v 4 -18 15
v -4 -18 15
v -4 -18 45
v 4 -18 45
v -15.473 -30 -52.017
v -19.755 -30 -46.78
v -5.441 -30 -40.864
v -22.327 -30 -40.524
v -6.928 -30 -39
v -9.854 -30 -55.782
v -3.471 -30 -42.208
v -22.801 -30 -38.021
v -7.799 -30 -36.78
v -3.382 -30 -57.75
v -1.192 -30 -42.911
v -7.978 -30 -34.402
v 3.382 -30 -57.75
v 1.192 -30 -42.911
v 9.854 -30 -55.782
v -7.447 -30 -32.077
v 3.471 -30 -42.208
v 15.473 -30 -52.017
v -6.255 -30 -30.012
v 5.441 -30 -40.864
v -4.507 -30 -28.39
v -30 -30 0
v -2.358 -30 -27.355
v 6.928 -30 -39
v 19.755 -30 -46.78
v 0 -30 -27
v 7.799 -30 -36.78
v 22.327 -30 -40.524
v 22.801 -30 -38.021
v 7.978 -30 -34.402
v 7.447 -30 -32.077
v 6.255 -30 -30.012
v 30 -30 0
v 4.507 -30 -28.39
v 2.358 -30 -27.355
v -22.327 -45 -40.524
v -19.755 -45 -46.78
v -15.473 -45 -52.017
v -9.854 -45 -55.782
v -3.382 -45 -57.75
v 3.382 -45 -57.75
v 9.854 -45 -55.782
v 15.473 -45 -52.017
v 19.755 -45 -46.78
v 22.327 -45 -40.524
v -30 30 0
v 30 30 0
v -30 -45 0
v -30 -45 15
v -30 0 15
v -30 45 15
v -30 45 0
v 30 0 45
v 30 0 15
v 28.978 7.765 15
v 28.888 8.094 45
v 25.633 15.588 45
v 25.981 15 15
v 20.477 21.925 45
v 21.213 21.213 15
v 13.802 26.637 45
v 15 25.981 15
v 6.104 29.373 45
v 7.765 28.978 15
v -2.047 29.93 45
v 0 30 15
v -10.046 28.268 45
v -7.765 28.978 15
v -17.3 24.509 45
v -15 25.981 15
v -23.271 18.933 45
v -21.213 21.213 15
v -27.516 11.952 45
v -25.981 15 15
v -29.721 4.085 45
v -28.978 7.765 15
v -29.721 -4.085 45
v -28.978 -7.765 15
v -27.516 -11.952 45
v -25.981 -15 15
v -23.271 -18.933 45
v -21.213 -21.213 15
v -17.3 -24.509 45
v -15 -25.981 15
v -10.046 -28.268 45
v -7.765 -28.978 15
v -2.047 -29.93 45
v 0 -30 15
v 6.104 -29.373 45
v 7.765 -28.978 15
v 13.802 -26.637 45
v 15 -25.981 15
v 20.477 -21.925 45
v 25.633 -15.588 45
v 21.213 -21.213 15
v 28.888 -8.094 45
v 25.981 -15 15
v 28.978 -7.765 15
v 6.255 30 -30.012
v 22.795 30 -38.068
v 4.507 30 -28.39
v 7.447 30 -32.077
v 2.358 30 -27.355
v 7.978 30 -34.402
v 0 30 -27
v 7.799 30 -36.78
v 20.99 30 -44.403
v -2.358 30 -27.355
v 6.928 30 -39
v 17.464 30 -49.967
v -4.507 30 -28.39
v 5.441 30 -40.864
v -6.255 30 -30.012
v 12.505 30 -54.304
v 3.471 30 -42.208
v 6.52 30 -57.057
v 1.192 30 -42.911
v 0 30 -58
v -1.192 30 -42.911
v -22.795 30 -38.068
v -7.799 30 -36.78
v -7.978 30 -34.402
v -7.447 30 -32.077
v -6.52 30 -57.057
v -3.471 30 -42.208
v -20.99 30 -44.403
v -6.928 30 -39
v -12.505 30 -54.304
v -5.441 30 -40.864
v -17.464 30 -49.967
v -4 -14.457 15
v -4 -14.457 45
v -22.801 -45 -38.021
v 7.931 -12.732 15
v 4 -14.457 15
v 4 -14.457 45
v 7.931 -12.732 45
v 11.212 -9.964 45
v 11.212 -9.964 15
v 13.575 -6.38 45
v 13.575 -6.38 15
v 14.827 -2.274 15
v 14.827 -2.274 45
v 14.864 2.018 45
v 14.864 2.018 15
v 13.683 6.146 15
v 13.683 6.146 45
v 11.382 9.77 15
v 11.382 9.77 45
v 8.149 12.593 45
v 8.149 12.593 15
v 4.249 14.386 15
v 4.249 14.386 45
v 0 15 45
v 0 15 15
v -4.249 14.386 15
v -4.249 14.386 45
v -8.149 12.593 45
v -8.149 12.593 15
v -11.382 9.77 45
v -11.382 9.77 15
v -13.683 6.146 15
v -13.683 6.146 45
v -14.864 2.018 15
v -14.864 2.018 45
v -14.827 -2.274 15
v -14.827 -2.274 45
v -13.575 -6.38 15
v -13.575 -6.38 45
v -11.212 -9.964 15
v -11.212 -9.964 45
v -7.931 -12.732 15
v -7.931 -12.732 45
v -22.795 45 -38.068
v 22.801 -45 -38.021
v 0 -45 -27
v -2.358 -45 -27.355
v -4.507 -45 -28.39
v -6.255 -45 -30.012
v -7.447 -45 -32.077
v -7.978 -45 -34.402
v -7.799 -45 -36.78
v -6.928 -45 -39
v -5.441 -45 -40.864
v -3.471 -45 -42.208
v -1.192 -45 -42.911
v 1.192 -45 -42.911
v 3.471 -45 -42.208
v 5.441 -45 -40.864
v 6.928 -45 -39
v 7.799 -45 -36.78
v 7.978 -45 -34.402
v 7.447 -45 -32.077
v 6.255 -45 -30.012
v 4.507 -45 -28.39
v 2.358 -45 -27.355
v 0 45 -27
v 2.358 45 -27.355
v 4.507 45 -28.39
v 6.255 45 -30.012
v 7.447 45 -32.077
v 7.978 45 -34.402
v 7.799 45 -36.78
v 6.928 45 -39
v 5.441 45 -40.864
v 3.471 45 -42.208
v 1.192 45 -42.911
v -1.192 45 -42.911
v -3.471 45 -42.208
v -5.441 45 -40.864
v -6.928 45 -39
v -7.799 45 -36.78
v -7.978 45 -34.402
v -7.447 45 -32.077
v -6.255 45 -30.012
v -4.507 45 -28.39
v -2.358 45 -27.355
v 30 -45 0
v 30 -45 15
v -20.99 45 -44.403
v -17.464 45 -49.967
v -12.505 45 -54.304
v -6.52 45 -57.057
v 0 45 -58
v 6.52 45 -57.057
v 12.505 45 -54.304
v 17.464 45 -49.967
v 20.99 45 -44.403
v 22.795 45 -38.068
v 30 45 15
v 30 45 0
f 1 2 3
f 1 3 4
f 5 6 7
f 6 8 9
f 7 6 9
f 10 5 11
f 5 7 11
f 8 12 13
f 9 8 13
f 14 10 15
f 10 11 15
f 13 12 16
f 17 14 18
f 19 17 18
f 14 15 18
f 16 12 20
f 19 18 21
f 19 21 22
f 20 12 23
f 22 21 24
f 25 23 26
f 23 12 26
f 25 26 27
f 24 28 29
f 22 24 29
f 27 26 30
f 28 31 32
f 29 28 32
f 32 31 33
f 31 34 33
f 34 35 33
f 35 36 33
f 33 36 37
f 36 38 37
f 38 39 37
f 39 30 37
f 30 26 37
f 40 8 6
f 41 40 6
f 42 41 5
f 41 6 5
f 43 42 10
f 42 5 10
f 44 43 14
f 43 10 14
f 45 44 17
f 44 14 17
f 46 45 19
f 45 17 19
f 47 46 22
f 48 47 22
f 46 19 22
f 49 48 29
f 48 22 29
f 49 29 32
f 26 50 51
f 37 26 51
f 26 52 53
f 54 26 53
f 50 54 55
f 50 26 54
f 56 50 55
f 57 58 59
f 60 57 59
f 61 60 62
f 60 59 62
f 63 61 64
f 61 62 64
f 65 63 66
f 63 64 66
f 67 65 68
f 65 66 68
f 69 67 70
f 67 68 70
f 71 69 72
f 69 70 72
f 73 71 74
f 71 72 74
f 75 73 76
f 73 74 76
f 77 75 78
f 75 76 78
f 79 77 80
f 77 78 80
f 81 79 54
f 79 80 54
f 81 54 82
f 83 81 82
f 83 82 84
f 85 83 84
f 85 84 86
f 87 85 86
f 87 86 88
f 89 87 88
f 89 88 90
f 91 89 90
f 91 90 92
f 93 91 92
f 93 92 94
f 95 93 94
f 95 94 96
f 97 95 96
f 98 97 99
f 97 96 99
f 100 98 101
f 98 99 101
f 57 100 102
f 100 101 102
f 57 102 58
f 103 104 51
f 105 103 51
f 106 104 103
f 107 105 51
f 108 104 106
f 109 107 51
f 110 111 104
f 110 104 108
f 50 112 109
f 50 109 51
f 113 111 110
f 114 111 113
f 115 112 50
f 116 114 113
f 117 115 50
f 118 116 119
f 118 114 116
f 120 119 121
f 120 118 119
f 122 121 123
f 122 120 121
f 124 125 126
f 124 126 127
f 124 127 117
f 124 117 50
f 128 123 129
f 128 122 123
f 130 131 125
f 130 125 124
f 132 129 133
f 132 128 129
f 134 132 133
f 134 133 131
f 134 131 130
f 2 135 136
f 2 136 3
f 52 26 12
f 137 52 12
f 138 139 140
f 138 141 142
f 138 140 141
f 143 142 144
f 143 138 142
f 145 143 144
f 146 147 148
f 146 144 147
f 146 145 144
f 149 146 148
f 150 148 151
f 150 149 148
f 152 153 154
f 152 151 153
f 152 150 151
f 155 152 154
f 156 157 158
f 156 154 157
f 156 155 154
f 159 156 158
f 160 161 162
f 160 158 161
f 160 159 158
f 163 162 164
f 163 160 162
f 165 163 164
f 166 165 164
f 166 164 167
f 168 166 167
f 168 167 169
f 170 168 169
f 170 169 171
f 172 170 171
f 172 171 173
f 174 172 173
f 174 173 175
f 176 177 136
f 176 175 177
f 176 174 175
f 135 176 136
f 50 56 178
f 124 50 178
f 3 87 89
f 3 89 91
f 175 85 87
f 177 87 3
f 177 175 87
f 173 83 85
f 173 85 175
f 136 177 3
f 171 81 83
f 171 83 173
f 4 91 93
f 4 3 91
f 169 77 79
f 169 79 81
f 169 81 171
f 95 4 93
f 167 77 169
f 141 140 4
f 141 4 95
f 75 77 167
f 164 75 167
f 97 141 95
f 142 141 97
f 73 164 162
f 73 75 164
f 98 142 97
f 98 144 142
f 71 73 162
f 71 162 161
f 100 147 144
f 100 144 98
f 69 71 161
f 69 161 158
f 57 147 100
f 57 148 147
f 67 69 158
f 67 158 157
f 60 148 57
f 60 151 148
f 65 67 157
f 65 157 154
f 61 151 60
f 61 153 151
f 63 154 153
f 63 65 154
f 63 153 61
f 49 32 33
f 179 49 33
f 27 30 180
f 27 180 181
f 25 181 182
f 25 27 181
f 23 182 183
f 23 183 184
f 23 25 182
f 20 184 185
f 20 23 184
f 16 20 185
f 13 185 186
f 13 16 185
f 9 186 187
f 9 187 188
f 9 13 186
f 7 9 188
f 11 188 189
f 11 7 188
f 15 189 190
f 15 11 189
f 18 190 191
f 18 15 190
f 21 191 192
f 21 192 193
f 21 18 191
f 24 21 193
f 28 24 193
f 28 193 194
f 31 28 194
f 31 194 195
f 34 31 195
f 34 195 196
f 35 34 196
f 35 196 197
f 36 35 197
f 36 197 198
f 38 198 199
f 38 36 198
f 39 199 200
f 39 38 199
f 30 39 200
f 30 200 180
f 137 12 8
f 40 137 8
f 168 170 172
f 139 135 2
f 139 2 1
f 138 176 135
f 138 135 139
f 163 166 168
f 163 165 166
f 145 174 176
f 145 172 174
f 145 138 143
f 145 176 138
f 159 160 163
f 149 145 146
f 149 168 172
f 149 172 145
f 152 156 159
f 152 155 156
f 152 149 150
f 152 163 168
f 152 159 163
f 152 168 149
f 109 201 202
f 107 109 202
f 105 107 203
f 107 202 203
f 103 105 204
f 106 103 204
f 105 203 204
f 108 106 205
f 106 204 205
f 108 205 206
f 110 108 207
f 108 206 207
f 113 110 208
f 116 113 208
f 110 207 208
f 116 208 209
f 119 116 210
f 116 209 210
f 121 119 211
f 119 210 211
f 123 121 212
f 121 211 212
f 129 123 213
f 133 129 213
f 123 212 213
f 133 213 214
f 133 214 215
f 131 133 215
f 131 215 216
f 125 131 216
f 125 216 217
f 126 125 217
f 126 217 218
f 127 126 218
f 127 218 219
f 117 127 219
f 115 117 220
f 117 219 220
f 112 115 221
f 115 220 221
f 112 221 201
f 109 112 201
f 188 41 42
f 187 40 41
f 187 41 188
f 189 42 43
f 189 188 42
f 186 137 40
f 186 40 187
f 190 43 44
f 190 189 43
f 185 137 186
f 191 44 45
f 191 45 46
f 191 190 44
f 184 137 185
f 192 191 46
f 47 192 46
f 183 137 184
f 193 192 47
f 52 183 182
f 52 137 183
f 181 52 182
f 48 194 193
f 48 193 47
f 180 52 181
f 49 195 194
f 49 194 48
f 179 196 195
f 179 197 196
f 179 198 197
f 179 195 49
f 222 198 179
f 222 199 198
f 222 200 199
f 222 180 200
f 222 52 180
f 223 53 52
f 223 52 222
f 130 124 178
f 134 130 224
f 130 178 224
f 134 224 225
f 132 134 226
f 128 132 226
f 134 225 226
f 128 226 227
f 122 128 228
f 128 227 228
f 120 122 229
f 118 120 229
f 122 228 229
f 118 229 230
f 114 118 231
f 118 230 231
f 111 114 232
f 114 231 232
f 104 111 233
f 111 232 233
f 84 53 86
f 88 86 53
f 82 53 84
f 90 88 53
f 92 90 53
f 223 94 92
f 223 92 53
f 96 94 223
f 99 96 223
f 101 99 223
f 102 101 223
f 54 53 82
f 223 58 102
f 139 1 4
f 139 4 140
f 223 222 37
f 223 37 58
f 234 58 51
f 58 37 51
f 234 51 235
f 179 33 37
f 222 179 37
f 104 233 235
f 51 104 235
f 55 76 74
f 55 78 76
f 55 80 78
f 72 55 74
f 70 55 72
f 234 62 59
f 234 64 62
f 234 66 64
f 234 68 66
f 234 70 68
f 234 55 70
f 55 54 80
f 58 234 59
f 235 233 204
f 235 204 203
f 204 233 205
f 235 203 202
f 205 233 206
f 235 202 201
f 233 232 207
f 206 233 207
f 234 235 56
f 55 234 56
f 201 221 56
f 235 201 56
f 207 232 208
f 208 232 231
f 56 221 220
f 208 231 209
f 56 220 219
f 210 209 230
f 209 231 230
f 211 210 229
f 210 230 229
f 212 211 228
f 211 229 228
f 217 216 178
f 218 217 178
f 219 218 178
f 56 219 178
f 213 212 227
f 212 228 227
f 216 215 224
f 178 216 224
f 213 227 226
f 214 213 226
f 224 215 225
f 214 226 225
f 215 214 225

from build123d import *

# Parameters (mm, degrees)
SKETCH1_W           = 60
SKETCH1_H           = 90
BOSS_EXTRUDE1_DEPTH = 15
SKETCH2_R           = 30
SKETCH2_R_2         = 15
BOSS_EXTRUDE2_DEPTH = 30
CUT_EXTRUDE1_START  = -30
CUT_EXTRUDE1_DEPTH  = 30
SKETCH4_R           = 8
BOSS_EXTRUDE4_DEPTH = 15
BOSS_EXTRUDE5_START = -15
SKETCH8_R           = 8
BOSS_EXTRUDE5_DEPTH = 15


with BuildPart() as part:
    # Sketch1 → Boss-Extrude1 (new body)
    with BuildSketch(Plane.XY):
        Rectangle(SKETCH1_W, SKETCH1_H)
    extrude(amount=BOSS_EXTRUDE1_DEPTH)

    # Sketch2 → Boss-Extrude2 (add)
    with BuildSketch(Plane.XY.offset(15)):
        Circle(SKETCH2_R)
        Circle(SKETCH2_R_2, mode=Mode.SUBTRACT)
    extrude(amount=BOSS_EXTRUDE2_DEPTH)

    # Sketch3 → Cut-Extrude1 (cut)
    with BuildSketch(Plane.XY.offset(45).offset(CUT_EXTRUDE1_START)):
        with BuildLine():
            Line((-4, -18), (4, -18))
            Line((4, -18), (4, -14.456832295))
            ThreePointArc((4, -14.456832295), (0, 15), (-4, -14.456832295))
            Line((-4, -14.456832295), (-4, -18))
        make_face()
    extrude(amount=CUT_EXTRUDE1_DEPTH, mode=Mode.SUBTRACT)

    # Sketch4 → Boss-Extrude4 (add)
    with BuildSketch(Plane(origin=(0, 45, 0), x_dir=(1, 0, 0), z_dir=(0, 1, 0))):
        with BuildLine():
            Line((-30, 0), (-22.79450882, 38.067632254))
            ThreePointArc((-22.79450882, 38.067632254), (0, 58), (22.79450882, 38.067632254))
            Line((22.79450882, 38.067632254), (30, 0))
            Line((30, 0), (-30, 0))
        make_face()
        with Locations(Location((0, 35, 0), (0, 0, 270))):
            Circle(SKETCH4_R, mode=Mode.SUBTRACT)
    extrude(amount=-BOSS_EXTRUDE4_DEPTH)

    # Sketch8 → Boss-Extrude5 (add)
    with BuildSketch(Plane.XZ.offset(45).offset(BOSS_EXTRUDE5_START)):
        with BuildLine():
            Line((30, 0), (-30, 0))
            Line((-30, 0), (-22.800687568, -38.021364997))
            Line((-22.800687568, -38.021364997), (-22.326909292, -40.523506265))
            ThreePointArc((-22.326909292, -40.523506265), (0, -58), (22.326909292, -40.523506265))
            Line((22.326909292, -40.523506265), (22.800687568, -38.021364997))
            Line((22.800687568, -38.021364997), (30, 0))
        make_face()
        with Locations(Location((0, -35, 0), (0, 0, 90))):
            Circle(SKETCH8_R, mode=Mode.SUBTRACT)
    extrude(amount=BOSS_EXTRUDE5_DEPTH)


solid = part.part
